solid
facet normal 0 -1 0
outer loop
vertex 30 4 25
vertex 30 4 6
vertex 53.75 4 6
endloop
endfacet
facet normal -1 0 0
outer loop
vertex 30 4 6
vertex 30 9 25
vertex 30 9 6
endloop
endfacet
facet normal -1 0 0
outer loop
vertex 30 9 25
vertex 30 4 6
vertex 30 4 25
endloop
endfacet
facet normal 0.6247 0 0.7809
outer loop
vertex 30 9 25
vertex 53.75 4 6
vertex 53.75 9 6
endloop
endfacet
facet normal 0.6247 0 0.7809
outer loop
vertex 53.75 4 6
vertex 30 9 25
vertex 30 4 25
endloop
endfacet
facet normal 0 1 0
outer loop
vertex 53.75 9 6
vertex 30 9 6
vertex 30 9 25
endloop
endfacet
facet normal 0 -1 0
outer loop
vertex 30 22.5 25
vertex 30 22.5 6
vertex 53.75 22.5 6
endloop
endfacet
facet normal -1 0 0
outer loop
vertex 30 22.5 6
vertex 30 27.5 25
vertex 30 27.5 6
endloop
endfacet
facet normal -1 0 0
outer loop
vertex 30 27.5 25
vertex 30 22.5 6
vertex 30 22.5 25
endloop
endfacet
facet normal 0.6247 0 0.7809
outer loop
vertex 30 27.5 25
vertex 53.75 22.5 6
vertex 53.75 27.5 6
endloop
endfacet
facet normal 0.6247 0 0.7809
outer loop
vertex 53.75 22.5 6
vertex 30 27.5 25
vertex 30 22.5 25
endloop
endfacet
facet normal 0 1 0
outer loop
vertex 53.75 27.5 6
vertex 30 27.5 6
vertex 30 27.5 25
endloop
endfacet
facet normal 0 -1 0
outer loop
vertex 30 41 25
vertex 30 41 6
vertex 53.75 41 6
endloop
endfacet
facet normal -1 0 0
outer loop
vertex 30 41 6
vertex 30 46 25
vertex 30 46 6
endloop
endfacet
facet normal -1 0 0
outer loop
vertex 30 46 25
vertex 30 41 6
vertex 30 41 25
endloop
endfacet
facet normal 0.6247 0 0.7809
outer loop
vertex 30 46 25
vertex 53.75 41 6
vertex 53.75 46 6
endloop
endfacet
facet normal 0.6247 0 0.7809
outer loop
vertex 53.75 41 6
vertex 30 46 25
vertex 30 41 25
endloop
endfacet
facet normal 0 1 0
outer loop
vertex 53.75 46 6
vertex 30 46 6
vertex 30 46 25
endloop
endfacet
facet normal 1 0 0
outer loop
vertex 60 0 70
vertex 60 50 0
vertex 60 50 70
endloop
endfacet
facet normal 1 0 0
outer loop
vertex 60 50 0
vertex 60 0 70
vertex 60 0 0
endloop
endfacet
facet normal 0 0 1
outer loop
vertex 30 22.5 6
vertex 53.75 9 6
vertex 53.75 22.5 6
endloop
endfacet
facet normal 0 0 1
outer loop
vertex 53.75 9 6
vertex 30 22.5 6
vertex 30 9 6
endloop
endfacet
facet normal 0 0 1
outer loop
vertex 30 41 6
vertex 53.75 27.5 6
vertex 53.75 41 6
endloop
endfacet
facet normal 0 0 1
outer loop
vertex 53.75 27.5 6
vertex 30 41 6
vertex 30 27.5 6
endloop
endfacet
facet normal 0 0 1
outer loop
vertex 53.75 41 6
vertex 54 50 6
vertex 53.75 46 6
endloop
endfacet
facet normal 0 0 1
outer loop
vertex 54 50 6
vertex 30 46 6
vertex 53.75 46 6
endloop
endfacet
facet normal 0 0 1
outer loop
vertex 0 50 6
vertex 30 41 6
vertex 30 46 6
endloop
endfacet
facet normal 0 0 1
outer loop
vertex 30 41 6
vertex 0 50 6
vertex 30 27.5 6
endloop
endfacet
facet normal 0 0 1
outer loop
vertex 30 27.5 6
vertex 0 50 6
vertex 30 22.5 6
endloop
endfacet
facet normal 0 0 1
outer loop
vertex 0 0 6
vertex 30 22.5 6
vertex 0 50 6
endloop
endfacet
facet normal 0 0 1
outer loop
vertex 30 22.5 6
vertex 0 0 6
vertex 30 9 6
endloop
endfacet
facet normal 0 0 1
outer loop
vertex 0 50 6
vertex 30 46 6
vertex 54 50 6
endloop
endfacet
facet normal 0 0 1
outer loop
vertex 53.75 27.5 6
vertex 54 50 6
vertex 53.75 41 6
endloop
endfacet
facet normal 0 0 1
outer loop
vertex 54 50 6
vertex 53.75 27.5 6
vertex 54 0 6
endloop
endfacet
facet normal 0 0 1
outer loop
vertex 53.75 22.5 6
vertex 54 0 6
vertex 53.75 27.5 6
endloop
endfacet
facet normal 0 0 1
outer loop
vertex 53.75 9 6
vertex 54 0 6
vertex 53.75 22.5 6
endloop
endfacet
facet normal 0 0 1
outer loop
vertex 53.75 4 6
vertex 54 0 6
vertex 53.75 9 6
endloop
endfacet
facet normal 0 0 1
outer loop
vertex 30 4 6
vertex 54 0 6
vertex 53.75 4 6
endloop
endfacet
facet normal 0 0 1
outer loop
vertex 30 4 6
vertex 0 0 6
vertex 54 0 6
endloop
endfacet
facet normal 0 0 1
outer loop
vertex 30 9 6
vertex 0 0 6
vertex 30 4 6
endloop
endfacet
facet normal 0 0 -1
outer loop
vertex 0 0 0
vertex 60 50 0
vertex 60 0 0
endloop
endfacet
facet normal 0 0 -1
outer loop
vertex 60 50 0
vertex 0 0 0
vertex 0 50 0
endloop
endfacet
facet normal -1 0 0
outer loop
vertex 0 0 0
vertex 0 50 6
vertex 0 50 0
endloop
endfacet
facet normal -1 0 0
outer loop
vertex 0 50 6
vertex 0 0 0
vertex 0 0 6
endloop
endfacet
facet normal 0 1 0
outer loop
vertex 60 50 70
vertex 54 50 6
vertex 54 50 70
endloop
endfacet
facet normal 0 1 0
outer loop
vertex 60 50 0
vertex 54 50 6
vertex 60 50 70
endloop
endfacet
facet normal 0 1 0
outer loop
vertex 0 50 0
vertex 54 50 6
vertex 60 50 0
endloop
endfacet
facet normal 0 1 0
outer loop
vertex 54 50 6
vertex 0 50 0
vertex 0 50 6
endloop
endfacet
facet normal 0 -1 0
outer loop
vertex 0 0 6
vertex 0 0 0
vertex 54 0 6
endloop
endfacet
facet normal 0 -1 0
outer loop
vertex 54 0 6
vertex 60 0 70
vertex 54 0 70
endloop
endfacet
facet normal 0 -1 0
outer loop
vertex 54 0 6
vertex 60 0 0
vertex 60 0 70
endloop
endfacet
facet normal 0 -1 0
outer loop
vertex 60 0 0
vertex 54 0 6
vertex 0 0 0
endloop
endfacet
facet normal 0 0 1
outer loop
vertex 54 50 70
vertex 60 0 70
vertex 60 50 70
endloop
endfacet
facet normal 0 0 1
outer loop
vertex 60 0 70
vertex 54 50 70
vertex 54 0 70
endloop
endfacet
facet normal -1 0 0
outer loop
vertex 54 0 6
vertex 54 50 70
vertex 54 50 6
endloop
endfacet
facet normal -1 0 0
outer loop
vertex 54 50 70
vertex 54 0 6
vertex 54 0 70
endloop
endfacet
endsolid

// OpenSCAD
$fn = 32;

// ----------------------------------------------------------------------
// Rib bracket: 3-gusset L bracket
// ----------------------------------------------------------------------

// --- parameters (mm) ---
base_l = 60;              // foot length, X
base_w = 50;              // foot width, Y
base_t = 6;               // foot thickness
plate_t = 6;              // upright plate thickness
plate_h = 70;             // overall height
gus_l = 24;               // gusset leg along the foot
gus_h = 20;               // gusset height
gus_t = 5;                // gusset thickness
gus_edge = 4;             // gusset margin from the foot edge
n_gus = 3;                // gusset count

gus_pitch = (base_w - 2 * gus_edge - gus_t) / (n_gus - 1);  // gusset pitch

union() {
  cube([base_l, base_w, base_t]);
  translate([base_l - plate_t, 0, base_t - 1])
    cube([plate_t, base_w, plate_h - base_t + 1]);
  for (i = [0 : n_gus - 1])
    translate([base_l - plate_t - gus_l, gus_edge + i * gus_pitch, base_t - 1])
      rotate([-90, 0, 0])
        linear_extrude(height = gus_t)
          polygon(points = [[0, 0], [gus_l + 1, 0], [0, -gus_h]]);
}
